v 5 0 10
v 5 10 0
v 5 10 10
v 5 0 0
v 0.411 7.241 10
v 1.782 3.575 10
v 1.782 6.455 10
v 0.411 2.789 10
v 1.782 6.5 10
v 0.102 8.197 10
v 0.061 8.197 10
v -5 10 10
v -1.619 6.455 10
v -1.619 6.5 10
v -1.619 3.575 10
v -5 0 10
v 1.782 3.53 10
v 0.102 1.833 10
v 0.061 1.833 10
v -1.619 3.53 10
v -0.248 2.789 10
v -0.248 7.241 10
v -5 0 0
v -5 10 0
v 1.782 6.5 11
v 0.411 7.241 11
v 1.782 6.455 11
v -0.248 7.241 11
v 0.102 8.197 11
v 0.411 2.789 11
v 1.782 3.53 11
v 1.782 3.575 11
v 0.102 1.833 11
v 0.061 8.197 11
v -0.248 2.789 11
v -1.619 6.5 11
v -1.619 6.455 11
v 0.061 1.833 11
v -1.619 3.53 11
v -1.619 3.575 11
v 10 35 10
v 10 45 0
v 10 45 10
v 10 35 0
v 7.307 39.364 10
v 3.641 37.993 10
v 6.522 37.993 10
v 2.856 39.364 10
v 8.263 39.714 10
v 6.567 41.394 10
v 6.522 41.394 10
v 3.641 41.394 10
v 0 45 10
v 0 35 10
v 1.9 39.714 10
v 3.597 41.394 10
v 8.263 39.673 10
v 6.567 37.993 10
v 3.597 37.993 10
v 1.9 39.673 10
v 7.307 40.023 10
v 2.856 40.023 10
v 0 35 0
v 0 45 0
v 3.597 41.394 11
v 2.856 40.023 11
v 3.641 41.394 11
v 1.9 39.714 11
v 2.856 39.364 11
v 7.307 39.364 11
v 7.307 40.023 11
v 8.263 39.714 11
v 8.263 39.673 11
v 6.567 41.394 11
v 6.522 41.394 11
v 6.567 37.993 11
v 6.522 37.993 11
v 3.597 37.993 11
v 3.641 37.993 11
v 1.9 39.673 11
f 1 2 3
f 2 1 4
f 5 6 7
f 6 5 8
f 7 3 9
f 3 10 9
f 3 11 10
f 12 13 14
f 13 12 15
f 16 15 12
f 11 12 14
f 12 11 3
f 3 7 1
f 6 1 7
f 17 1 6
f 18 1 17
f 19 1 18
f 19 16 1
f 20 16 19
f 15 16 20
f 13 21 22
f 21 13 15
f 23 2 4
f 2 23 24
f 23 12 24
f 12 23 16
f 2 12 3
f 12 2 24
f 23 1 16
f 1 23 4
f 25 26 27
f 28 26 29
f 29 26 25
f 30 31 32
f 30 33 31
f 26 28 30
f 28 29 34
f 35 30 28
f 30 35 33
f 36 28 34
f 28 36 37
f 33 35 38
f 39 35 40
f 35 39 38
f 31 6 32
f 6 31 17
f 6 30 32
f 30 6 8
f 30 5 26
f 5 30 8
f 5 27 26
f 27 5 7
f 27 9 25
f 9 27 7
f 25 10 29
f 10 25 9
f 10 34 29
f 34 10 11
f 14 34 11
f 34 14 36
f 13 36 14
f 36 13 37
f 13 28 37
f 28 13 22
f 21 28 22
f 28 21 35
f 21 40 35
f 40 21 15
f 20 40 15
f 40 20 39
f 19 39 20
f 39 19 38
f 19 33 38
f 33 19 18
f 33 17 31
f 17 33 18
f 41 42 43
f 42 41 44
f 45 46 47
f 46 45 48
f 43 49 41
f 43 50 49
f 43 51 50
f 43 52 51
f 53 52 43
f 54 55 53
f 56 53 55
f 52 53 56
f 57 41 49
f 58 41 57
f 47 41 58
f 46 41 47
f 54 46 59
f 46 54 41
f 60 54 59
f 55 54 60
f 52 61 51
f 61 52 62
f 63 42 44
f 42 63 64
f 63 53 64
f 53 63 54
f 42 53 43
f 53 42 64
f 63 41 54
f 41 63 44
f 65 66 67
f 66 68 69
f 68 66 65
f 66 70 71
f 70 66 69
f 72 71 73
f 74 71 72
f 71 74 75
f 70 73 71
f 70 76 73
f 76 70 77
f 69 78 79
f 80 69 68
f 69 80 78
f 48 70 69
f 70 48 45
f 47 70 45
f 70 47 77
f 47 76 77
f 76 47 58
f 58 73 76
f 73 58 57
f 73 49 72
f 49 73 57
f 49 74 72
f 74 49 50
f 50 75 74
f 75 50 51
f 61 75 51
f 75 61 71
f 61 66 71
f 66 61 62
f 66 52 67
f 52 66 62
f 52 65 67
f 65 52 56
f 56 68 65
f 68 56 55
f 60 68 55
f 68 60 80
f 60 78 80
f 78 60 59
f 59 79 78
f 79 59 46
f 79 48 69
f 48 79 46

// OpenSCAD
// -*- mode: SCAD ; c-file-style: "ellemtel" ; coding: utf-8 -*-
//
// Rough extruder offest calibration
// Extruder one part
// Just a few simple blocks
//
// © 2017 Roland Sieker <ospalh@gmail.com>
// Licence: CC-BY-SA 4.0



// Change this to fit your actual printer, as well as you know
nozzle_offset_x = 36;
nozzle_offset_y = 0.0;



font_name = "Demos LT";
// font_name = "Palatino";
// font_name = "serif";
// font_name = "bugger, haven’t got this one";
font_name_2 = "Demos X";
font_name_3 = "serif";
some_distance = 40;



// Y
translate([-5, 0, 0])
{
   cube([10,10,10]);
   translate([5, 2, 10])
   {
      linear_extrude(1)
      {
         text("↕", 6, font=font_name_3, halign="center", valgin="center");
      }
   }
}



// X


translate([0, some_distance,0])
{
   translate([0, -5, 0])
   {
      cube([10,10,10]);
      translate([5, 2, 10])
      {
         linear_extrude(1)
         {
            text("↔", 6, font=font_name_3, halign="center", valgin="center");
         }
      }
   }
}
